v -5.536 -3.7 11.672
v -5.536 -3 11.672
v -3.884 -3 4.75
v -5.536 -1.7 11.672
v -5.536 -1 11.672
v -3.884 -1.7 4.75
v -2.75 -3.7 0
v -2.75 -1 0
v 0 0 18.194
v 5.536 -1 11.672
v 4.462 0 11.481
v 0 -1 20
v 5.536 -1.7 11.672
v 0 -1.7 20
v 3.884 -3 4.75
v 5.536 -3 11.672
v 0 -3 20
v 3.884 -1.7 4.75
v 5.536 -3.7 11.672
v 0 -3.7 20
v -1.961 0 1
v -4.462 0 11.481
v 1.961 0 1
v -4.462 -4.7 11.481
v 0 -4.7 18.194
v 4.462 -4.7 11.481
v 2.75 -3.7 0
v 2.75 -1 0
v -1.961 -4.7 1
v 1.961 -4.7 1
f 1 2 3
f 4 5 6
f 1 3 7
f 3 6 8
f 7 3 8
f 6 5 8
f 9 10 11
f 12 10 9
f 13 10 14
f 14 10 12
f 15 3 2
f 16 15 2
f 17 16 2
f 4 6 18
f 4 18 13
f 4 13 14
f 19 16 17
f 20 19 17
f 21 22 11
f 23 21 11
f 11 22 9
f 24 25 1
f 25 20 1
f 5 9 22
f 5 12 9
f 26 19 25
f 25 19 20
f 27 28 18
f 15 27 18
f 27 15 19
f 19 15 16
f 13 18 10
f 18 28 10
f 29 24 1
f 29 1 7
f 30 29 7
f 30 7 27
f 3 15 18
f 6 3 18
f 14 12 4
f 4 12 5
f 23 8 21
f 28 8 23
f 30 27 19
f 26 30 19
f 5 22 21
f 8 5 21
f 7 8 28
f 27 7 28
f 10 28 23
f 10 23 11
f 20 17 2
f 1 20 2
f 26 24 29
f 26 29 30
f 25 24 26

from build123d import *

# Parameters (mm, degrees)
F1_DEPTH = 4.7
F2_W     = 1.3
F2_H     = 20
F3_DEPTH = 10
F4_SIZE  = 1


with BuildPart() as f1:
    # F0 (on Front) → F1 (new body)
    with BuildSketch(Plane.XZ):
        Polygon((-5.535933, 11.672128), (-2.75, 0), (2.75, 0), (5.535933, 11.672128), (0, 20), align=None)
    extrude(amount=F1_DEPTH)

    # F2 (on Right) → F3 (cut, symmetric)
    with BuildSketch(Plane.YZ):
        with Locations((-2.35, 14.75)):
            Rectangle(F2_W, F2_H)
    extrude(amount=F3_DEPTH, both=True, mode=Mode.SUBTRACT)

    # F4
    f4_edges = [f1.edges().sort_by_distance(p)[0] for p in [
        (-4.142966, -4.7, 5.836064),
        (0, -4.7, 0),
        (4.142966, -4.7, 5.836064),
        (2.767966, -4.7, 15.836064),
        (-2.767966, -4.7, 15.836064),
        (-4.142966, 0, 5.836064),
        (0, 0, 0),
        (4.142966, 0, 5.836064),
        (2.767966, 0, 15.836064),
        (-2.767966, 0, 15.836064),
    ]]
    chamfer(f4_edges, length=F4_SIZE)


solid = f1.part
